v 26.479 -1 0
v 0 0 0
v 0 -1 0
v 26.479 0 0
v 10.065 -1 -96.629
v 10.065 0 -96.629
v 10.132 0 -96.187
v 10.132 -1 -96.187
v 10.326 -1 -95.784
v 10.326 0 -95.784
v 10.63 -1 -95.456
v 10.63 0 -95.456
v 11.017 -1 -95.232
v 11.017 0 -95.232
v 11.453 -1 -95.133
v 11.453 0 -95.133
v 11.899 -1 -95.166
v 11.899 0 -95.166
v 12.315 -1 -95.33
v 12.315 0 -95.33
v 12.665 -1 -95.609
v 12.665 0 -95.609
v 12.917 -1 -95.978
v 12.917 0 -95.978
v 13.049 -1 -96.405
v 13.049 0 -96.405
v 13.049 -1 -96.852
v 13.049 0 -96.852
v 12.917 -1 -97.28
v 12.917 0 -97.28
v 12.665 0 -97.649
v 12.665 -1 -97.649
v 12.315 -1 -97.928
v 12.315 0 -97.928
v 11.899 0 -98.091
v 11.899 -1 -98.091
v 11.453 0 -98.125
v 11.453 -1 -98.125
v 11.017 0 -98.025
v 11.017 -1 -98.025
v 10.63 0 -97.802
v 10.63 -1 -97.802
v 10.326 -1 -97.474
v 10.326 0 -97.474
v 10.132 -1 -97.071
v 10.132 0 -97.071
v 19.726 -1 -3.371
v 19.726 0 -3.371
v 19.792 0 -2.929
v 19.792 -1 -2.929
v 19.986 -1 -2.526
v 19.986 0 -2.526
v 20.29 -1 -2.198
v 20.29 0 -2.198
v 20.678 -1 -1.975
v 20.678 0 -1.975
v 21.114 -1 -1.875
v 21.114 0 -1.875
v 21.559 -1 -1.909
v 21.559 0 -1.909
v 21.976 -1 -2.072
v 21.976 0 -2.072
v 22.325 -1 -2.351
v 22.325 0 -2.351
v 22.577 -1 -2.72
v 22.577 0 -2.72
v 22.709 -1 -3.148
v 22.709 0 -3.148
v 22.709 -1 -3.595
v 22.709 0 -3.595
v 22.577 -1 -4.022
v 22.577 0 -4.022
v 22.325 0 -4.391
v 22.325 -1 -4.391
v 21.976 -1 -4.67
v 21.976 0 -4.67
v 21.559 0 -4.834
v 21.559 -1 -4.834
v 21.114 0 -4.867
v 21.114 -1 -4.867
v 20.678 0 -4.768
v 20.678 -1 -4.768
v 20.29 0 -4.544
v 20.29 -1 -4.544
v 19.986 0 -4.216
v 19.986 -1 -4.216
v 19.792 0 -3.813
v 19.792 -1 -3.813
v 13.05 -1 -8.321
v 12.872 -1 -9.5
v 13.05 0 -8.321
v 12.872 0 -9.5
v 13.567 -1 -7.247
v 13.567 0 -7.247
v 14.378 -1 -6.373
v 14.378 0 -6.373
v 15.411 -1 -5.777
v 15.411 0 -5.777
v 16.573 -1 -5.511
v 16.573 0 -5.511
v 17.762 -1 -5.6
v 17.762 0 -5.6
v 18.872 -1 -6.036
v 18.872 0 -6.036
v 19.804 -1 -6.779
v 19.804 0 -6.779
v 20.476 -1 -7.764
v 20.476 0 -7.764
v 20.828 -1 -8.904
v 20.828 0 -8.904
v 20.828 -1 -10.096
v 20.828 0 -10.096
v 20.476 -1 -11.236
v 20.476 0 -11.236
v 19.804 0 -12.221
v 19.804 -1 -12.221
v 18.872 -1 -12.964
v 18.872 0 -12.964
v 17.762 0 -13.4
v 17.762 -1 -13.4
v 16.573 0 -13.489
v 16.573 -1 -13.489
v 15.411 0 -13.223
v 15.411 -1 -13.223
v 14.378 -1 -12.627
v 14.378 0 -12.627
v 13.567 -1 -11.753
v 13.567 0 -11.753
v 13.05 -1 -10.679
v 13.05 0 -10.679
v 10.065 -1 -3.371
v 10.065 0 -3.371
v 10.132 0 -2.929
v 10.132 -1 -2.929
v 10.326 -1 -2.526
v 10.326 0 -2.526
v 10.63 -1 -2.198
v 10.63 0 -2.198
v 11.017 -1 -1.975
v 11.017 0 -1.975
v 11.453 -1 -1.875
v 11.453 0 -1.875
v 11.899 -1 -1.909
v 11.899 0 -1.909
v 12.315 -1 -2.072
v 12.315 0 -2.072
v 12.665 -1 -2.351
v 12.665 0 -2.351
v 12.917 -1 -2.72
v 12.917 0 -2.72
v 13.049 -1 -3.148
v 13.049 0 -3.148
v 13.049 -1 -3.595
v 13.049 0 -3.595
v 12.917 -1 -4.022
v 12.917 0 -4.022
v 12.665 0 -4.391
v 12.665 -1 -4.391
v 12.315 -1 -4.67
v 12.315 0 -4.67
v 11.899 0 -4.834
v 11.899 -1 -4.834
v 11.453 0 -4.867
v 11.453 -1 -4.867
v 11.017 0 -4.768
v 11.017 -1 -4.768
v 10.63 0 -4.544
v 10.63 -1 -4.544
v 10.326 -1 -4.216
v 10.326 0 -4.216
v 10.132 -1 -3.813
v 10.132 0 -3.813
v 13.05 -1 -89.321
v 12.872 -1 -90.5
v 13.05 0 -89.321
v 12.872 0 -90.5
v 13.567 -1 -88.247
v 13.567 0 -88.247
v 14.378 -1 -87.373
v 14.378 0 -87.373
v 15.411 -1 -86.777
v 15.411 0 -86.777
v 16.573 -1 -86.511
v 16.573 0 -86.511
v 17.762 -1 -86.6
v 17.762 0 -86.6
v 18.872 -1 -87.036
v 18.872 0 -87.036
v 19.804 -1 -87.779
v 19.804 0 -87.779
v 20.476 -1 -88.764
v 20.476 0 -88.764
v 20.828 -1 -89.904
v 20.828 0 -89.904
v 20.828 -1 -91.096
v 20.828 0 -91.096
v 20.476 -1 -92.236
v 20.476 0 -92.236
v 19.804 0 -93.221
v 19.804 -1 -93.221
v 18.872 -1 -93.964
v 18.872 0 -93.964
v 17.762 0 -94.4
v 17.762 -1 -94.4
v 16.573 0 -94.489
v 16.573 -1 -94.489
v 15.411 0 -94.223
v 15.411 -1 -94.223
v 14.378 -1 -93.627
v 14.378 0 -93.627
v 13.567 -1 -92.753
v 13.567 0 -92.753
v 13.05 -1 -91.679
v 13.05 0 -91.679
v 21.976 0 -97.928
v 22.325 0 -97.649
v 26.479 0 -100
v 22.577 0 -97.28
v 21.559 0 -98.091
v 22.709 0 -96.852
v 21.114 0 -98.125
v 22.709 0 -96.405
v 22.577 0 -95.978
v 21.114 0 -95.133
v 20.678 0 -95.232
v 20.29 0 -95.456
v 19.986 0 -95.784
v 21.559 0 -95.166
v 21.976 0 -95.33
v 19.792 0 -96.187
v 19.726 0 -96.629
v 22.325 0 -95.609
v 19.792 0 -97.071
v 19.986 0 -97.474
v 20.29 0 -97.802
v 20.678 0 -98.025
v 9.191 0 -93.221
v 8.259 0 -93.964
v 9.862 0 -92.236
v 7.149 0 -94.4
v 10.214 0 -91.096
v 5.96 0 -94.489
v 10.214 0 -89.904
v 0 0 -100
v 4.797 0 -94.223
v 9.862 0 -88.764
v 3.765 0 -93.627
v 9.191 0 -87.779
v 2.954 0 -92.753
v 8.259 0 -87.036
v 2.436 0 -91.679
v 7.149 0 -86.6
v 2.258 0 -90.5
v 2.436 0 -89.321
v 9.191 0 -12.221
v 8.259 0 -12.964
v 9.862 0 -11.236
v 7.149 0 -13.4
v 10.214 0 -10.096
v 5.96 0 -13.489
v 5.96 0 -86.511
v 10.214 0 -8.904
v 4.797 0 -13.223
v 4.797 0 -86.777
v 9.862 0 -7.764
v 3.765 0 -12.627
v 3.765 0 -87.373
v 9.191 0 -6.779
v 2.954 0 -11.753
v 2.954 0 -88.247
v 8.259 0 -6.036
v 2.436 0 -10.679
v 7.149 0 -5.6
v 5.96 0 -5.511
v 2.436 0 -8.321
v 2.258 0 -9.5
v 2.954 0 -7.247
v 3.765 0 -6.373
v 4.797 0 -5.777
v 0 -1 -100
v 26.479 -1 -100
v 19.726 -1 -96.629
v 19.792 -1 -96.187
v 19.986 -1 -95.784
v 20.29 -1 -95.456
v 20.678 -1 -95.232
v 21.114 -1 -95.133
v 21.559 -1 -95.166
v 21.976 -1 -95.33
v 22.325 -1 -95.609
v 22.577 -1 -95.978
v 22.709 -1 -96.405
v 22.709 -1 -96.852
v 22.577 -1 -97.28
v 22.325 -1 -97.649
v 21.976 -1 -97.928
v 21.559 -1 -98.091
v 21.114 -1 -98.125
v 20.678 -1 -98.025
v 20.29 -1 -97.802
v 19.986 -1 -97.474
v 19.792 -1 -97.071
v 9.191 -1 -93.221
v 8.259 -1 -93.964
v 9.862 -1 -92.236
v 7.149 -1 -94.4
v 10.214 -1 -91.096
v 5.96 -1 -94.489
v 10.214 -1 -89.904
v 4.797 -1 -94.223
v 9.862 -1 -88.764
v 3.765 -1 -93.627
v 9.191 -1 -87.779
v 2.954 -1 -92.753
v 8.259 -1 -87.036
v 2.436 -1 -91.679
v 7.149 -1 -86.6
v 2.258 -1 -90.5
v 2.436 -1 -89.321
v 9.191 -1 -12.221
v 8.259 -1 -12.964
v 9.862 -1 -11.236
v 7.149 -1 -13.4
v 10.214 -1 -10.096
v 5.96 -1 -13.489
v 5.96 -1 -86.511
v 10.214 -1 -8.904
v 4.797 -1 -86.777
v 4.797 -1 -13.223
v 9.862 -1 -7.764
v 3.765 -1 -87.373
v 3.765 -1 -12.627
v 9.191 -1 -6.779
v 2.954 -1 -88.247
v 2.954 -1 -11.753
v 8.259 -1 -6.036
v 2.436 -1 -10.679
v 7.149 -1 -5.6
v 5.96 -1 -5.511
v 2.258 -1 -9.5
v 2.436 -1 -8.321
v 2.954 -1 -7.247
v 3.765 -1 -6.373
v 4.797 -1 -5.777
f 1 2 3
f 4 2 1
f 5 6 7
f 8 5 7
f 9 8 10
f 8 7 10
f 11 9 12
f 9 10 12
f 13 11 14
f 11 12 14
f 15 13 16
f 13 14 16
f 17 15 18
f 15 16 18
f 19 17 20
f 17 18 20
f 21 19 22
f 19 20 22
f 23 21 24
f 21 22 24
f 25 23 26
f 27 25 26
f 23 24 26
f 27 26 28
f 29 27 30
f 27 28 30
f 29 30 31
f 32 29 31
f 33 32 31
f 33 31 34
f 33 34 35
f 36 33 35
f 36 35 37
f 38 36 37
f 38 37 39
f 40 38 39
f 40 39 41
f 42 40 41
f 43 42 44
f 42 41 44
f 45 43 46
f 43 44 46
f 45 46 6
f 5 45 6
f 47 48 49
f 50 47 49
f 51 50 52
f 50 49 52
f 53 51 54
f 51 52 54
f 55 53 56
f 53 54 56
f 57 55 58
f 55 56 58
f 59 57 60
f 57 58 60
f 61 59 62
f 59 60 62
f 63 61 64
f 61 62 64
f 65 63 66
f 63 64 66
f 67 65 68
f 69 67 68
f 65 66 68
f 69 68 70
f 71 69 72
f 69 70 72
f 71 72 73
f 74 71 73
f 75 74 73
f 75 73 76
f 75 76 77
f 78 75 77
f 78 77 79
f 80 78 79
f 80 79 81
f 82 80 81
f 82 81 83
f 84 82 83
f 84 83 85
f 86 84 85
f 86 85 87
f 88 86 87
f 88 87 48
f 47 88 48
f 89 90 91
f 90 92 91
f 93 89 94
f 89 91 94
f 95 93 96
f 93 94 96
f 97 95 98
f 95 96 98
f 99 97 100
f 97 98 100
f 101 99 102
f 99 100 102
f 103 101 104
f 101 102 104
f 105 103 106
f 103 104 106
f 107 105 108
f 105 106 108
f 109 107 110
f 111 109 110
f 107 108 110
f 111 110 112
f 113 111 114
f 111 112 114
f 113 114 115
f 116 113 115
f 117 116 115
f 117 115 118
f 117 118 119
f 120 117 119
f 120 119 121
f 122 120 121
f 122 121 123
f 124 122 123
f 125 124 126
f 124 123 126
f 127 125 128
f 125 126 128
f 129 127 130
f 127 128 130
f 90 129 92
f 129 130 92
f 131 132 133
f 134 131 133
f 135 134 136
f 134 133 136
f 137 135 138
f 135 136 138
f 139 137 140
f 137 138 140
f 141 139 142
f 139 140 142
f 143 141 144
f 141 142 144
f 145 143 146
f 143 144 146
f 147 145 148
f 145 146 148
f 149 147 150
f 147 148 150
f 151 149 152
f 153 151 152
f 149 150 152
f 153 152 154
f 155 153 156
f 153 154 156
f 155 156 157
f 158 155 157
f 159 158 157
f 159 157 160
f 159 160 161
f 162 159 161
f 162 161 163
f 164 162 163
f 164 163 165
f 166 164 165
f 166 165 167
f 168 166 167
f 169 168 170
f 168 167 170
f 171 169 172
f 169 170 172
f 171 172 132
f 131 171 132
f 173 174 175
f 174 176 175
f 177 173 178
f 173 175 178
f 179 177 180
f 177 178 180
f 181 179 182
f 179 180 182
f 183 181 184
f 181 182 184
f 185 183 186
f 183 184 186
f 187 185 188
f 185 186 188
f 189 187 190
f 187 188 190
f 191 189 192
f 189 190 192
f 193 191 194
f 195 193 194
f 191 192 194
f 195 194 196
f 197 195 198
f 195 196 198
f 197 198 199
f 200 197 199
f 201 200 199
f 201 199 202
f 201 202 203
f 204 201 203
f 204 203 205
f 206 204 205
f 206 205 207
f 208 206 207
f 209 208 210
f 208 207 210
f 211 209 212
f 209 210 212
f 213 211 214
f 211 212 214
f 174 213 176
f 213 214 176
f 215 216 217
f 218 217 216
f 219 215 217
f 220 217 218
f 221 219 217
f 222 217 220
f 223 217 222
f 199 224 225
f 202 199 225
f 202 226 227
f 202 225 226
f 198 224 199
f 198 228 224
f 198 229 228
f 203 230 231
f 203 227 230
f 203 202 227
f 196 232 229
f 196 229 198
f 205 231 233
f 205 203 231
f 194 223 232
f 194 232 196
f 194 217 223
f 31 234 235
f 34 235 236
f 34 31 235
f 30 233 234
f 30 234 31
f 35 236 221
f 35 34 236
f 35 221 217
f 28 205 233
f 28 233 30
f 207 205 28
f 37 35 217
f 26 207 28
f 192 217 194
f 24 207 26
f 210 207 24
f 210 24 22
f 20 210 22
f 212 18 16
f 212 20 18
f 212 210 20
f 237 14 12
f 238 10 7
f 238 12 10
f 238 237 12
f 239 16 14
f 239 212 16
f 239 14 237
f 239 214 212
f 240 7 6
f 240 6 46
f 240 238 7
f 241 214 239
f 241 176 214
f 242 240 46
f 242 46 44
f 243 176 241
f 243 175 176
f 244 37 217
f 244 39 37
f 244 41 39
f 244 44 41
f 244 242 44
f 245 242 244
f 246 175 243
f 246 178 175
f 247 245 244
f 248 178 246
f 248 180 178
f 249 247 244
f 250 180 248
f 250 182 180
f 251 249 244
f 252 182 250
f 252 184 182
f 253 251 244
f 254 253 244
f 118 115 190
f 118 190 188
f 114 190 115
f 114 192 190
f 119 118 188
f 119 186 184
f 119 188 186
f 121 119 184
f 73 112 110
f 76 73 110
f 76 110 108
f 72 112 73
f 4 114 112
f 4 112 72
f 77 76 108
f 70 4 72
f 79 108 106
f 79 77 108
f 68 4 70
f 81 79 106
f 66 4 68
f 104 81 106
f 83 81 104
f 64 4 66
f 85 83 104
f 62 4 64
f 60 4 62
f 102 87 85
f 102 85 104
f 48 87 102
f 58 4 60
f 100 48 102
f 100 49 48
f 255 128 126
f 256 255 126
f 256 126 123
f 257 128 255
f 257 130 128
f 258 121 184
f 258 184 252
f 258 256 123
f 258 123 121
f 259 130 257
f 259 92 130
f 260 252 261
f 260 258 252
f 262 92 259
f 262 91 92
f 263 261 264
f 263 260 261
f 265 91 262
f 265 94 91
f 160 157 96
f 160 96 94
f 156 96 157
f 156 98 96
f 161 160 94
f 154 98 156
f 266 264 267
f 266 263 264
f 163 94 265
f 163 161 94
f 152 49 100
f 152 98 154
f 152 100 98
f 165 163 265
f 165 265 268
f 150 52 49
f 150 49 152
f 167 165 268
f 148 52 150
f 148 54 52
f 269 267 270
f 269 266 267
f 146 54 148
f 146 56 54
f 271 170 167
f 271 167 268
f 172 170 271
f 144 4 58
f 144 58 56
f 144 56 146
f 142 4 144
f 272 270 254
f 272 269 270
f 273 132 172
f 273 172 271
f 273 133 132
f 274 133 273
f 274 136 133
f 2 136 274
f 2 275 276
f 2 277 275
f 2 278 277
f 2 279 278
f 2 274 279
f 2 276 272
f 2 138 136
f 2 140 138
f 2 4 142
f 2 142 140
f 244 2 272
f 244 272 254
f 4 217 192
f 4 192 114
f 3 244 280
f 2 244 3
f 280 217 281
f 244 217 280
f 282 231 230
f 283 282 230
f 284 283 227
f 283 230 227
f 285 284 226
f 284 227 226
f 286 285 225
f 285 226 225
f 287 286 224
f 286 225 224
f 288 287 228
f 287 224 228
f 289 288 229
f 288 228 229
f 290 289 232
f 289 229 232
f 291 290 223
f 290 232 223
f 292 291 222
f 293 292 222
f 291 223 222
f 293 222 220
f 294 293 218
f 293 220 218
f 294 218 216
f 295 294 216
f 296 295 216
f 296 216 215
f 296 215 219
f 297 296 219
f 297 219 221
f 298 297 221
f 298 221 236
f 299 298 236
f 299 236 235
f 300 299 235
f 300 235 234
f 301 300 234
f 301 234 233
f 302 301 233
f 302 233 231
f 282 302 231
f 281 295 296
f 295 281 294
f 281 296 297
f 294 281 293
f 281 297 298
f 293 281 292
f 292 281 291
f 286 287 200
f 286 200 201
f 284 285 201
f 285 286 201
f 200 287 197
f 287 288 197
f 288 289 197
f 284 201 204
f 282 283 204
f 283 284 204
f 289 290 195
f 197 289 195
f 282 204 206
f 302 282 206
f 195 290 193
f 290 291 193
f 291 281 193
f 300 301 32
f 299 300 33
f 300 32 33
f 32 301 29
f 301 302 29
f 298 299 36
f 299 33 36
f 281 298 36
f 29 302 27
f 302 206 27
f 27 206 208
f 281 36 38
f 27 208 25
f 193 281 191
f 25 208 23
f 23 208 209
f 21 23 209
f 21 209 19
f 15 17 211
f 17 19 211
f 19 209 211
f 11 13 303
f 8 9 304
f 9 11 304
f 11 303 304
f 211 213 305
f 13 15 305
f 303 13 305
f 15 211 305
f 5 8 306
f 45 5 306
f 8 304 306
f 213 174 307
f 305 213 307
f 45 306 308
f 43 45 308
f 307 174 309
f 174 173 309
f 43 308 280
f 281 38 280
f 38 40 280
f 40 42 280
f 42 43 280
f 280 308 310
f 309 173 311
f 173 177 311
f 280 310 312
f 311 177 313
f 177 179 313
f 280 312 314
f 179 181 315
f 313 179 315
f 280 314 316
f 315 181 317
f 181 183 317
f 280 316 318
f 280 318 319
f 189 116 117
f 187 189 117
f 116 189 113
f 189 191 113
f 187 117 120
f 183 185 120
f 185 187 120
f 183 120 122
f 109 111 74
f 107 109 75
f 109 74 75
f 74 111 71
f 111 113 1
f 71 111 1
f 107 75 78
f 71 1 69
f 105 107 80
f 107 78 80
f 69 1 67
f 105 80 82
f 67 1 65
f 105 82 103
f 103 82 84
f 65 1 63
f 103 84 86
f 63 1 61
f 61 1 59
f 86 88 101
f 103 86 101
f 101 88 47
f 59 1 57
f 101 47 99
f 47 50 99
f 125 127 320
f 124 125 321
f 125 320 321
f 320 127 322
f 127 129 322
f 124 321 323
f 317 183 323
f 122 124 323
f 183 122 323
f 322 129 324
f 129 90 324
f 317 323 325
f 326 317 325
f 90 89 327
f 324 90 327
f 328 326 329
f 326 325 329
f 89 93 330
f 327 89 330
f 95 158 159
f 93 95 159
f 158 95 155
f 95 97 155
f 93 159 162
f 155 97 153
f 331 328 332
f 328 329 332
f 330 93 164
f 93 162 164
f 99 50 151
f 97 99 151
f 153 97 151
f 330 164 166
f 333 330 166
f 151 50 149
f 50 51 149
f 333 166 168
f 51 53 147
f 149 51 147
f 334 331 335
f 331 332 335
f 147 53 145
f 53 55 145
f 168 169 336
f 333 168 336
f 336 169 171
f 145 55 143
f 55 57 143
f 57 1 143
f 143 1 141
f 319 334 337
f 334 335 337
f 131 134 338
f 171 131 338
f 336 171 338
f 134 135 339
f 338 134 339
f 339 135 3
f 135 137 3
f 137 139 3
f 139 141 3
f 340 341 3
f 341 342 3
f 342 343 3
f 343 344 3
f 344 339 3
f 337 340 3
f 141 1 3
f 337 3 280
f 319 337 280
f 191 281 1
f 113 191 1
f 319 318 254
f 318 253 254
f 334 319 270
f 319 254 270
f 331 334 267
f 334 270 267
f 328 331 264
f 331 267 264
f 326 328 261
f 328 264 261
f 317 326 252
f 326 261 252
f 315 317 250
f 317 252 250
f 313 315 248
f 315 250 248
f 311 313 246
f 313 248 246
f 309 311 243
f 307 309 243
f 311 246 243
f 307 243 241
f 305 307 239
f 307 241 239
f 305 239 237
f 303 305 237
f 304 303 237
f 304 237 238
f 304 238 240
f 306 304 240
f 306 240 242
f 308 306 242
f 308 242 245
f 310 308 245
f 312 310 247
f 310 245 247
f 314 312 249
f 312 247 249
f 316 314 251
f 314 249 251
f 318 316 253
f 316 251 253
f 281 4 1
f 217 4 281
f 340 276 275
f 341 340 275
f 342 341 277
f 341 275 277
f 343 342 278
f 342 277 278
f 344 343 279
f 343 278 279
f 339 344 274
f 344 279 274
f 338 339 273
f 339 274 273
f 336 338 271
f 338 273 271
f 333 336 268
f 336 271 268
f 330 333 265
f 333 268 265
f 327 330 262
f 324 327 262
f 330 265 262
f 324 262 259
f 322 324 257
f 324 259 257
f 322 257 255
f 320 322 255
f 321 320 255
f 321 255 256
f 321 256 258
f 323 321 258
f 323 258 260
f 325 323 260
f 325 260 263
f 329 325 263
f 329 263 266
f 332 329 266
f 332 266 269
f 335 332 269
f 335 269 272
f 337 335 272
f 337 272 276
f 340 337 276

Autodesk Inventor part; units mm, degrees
ref_plane "YZ Plane" through (0, 0, 0) normal (1, 0, 0) x (0, 1, 0)
ref_plane "XZ Plane" through (0, 0, 0) normal (0, 1, 0) x (-1, 0, 0)
ref_plane "XY Plane" through (0, 0, 0) normal (0, 0, 1) x (1, 0, 0)
sketch "Sketch1" plane through (0, 0, 0) normal (0, 0, 1) x (1, 0, 0)
  line L0 (0.65, -95.0088) -> (0.65, -83.2008) construction
  line L1 (2.65, -83.2008) -> (2.65, -91.0088) construction
  line L2 (2.65, -91.0088) -> (4.65, -91.0088) construction
  line L3 (4.65, -91.0088) -> (0.65, -95.0088) construction
  circle A0 centre (15.35, -55.1458) radius 14.7 construction
  line L4 (3.0006, -90.8088) -> (30.45, -86.6259)
  line L5 (30.45, -86.6259) -> (30.2994, -85.6374)
  line L6 (30.2994, -85.6374) -> (2.85, -89.8202)
  line L7 (2.85, -89.8202) -> (3.0006, -90.8088)
  line L8 (30.45, -86.6259) -> (30.45, -70.1877) construction
  line L9 (25.65, -86.3458) -> (5.15, -86.3458) projected
  line L10 (5.15, -86.3458) -> (5.15, -69.8458) projected
  line L11 (25.65, -69.8458) -> (5.15, -69.8458) projected
  line L12 (25.65, -86.3458) -> (25.65, -69.8458) projected
  line L13 (0.65, -83.2008) -> (2.65, -83.2008) projected
  dimension "d0" = 1
  dimension "d1" = 0.2
  dimension "d2" = 0.2
  dimension "d3" = 0.4
  dimension "d4" = 0
  dimension "d17" = 27.7662
extrude "Extrusion1" [suppressed]
sketch "Sketch2" plane through (30.45, -86.6259, -50) normal (0.1506, -0.9886, 0) x (0.9886, 0.1506, 0)
  line L0 (-25.9454, 16.5) -> (-25.9454, 83.5) projected
  line L1 (-27.9685, 0) -> (-27.9685, 3) projected
  circle A0 centre (-5.2783, 96.6469) radius 1.5
  circle A1 centre (-14.8697, 96.6469) radius 1.5
  circle A2 centre (-14.8697, 3.3531) radius 1.5
  circle A3 centre (-5.2783, 3.3531) radius 1.5
  circle A4 centre (-9.5918, 90.5) radius 4
  circle A5 centre (-20.1476, 90.5) radius 4
  circle A6 centre (-9.5918, 9.5) radius 4
  circle A7 centre (-20.1476, 9.5) radius 4
  line L2 (-27.3313, 20) -> (-27.3313, 3) projected
  line L3 (-2.2753, 15.5) -> (-24.9339, 15.5) projected
  line L4 (-13.8886, 7.2533) -> (-16.5988, 7.2533) projected
  line L5 (-27.9685, 20) -> (-27.9685, 80) projected
  line L6 (-2.2753, 3.6302) -> (-2.2753, 0) projected
  arc A8 (-7.1381, 5.9818) -> (-2.2753, 3.6302) centre (-5.2753, 3.6302) ccw projected
  arc A9 (-2.2753, 3.6302) -> (-7.1381, 5.9818) centre (-5.2753, 3.6302) ccw projected
  line L7 (-2.2753, 15.5) -> (-2.2753, 3.6302) projected
  line L8 (-27.3313, 3) -> (-27.9685, 3) projected
  ellipse E0 centre (-20.5244, 90.5) end of major axis (-15.9938, 90.5) minor radius 4.5 (-16.5988, 92.7467) -> (-16.5988, 88.2533) ccw projected
  line L9 (-16.5988, 92.7467) -> (-13.8886, 92.7467) projected
  ellipse E1 centre (-9.963, 90.5) end of major axis (-5.4324, 90.5) minor radius 4.5 (-7.1381, 94.0182) -> (-13.8886, 92.7467) ccw projected
  arc A10 (-2.2753, 96.3698) -> (-7.1381, 94.0182) centre (-5.2753, 96.3698) ccw projected
  line L10 (-2.2753, 96.3698) -> (-2.2753, 100) projected
  line L11 (-2.2753, 100) -> (-27.9685, 100) projected
  line L12 (-27.9685, 97) -> (-27.9685, 100) projected
  line L13 (-27.9685, 97) -> (-27.3313, 97) projected
  line L14 (-27.3313, 97) -> (-27.3313, 80) projected
  line L15 (-27.3313, 80) -> (-27.9685, 80) projected
  ellipse E2 centre (-24.9339, 83.5) end of major axis (-25.9454, 83.5) minor radius 1 (-24.9339, 84.5) -> (-25.9454, 83.5) ccw projected
  line L16 (-2.2753, 84.5) -> (-24.9339, 84.5) projected
  line L17 (-2.2753, 84.5) -> (-2.2753, 96.3698) projected
  arc A11 (-7.1381, 94.0182) -> (-2.2753, 96.3698) centre (-5.2753, 96.3698) ccw projected
  ellipse E3 centre (-9.963, 90.5) end of major axis (-5.4324, 90.5) minor radius 4.5 (-13.8886, 88.2533) -> (-7.1381, 94.0182) ccw projected
  line L18 (-13.8886, 88.2533) -> (-16.5988, 88.2533) projected
  circle A12 centre (-15.2437, 96.3698) radius 3 projected
  ellipse E4 centre (-9.963, 9.5) end of major axis (-5.4324, 9.5) minor radius 4.5 (-13.8886, 7.2533) -> (-7.1381, 5.9818) ccw projected
  ellipse E5 centre (-9.963, 9.5) end of major axis (-5.4324, 9.5) minor radius 4.5 (-7.1381, 5.9818) -> (-13.8886, 11.7467) ccw projected
  circle A13 centre (-15.2437, 3.6302) radius 3 projected
  line L19 (-27.9685, 20) -> (-27.3313, 20) projected
  line L20 (-2.2753, 0) -> (-27.9685, 0) projected
  ellipse E6 centre (-20.5244, 9.5) end of major axis (-15.9938, 9.5) minor radius 4.5 (-16.5988, 11.7467) -> (-16.5988, 7.2533) ccw projected
  line L21 (-16.5988, 11.7467) -> (-13.8886, 11.7467) projected
  ellipse E7 centre (-24.9339, 16.5) end of major axis (-25.9454, 16.5) minor radius 1 (-25.9454, 16.5) -> (-24.9339, 15.5) ccw projected
  point P0 (-17.0528, 50)
  point P1 (-16.268, 7.2533)
  point P2 (-16.3079, 7.2533)
  point P3 (-16.3688, 7.2533)
  point P4 (-16.5217, 7.2533)
  point P5 (-16.5463, 7.2533)
  point P6 (-14.6243, 7.2533)
  point P7 (-17.1998, 7.2533)
  point P8 (-9.892, 13.95)
  point P9 (-28.626, 82.5)
  point P10 (-14.5461, 11.7467)
  dimension "d7" = 3
  dimension "d8" = 3
  dimension "d9" = 3
  dimension "d10" = 3
  dimension "d13" = 8
  dimension "d14" = 8
  dimension "d15" = 8
  dimension "d16" = 8
extrude "Extrusion2" [suppressed]
sketch "Sketch5" plane through (0, 0, 0) normal (0, 1, 0) x (-1, 0, 0)
  line L0 (0, -100) -> (0, 0)
  line L1 (0, 0) -> (-26.4787, 0)
  line L2 (-26.4787, 0) -> (-26.4787, -100)
  line L3 (-26.4787, -100) -> (0, -100)
  circle A0 centre (-6.2585, -9.5) radius 4
  circle A1 centre (-21.2257, -96.6288) radius 1.5
  circle A2 centre (-11.5653, -3.3712) radius 1.5
  circle A3 centre (-16.8722, -90.5) radius 4
  circle A4 centre (-16.8722, -9.5) radius 4
  circle A5 centre (-11.5653, -96.6288) radius 1.5
  circle A6 centre (-21.2257, -3.3712) radius 1.5
  circle A7 centre (-6.2585, -90.5) radius 4
  point P0 (0, 0)
  dimension "d2" = 0.2
extrude "Extrusion5" add sketch "Sketch5" against normal blind 1
equation "\"d14\" = d13"
equation "\"d15\" = d13"
equation "\"d16\" = d13"
properties part number "SteelFront" material "Steel, Alloy"
